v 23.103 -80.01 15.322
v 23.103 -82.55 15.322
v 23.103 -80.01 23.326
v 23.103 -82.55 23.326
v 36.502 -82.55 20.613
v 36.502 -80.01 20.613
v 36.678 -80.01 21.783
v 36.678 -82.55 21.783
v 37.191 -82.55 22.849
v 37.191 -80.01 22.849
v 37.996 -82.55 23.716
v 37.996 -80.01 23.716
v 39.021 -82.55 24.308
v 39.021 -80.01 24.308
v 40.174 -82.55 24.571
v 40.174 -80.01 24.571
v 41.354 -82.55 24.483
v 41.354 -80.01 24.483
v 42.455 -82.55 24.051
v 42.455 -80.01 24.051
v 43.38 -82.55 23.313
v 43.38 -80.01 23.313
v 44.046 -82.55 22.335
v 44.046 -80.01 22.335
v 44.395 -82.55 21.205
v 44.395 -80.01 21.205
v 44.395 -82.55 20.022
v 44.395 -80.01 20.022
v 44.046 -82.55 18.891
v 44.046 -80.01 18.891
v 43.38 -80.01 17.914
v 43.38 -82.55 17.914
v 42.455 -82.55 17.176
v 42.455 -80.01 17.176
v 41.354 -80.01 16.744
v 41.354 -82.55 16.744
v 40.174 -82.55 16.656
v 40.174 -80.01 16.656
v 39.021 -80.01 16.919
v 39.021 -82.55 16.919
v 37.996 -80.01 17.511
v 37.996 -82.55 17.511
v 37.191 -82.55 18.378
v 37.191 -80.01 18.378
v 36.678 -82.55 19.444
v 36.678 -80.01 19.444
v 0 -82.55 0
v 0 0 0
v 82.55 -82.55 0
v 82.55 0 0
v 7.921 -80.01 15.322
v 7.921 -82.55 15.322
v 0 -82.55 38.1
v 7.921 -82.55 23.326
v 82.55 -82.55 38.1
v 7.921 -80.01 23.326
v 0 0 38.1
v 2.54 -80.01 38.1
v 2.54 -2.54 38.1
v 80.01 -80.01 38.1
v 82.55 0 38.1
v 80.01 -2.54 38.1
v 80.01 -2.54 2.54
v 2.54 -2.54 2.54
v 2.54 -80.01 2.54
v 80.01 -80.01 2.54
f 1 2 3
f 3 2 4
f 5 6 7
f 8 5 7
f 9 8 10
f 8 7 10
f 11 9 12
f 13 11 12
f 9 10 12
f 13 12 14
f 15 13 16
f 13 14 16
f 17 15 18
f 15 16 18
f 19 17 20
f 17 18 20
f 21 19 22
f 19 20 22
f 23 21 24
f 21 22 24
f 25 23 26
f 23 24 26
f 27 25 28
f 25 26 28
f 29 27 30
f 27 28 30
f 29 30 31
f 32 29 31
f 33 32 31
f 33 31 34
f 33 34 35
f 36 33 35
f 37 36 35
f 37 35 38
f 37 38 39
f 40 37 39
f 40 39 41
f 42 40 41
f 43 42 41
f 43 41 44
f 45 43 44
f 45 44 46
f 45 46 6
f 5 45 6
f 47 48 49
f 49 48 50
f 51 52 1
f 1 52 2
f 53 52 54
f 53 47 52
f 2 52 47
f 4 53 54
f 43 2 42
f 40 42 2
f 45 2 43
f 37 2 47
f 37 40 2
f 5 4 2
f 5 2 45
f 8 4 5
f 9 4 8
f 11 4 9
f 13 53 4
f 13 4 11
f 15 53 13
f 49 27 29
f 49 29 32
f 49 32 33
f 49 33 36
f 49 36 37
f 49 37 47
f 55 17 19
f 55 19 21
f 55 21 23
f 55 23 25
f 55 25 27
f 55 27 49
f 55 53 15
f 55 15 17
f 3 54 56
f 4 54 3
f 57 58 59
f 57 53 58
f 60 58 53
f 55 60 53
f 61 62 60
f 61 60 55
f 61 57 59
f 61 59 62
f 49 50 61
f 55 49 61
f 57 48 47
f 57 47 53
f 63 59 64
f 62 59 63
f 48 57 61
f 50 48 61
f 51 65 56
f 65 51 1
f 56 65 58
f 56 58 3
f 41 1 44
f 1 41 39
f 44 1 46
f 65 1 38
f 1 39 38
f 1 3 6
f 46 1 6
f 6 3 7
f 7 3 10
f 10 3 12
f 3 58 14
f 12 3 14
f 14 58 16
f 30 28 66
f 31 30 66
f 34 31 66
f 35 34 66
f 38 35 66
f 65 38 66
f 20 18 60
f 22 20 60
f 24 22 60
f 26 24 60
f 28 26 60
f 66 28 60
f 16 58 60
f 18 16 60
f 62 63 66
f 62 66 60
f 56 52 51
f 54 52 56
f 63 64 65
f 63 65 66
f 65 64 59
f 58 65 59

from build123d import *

# Parameters (mm, degrees)
F0_W     = 82.55
F0_H     = 38.1
F1_DEPTH = 82.55
F3_T     = -2.54
F5_D     = 7.9375
F5_DEPTH = 12.7
F6_W     = 15.181465
F6_H     = 8.003246
F7_DEPTH = 2.54


with BuildPart() as f1:
    # F0 (on Front) → F1 (new body)
    with BuildSketch(Plane.XZ):
        with Locations((41.275, 19.05)):
            Rectangle(F0_W, F0_H)
    extrude(amount=F1_DEPTH)

    # F3
    f3_openings = [f1.faces().sort_by_distance(p)[0] for p in [
        (41.275, -41.275, 38.1),
    ]]
    offset(amount=F3_T, openings=f3_openings)

    # F5
    with Locations(Plane.XZ.offset(82.55)):
        with Locations((40.470496, 20.613467)):
            Hole(F5_D / 2, depth=F5_DEPTH)

    # F6 (on face) → F7 (cut, through all)
    with BuildSketch(Plane.XZ.offset(82.55)):
        with Locations((15.511802, 19.324051)):
            Rectangle(F6_W, F6_H)
    extrude(amount=-F7_DEPTH, mode=Mode.SUBTRACT)


solid = f1.part
